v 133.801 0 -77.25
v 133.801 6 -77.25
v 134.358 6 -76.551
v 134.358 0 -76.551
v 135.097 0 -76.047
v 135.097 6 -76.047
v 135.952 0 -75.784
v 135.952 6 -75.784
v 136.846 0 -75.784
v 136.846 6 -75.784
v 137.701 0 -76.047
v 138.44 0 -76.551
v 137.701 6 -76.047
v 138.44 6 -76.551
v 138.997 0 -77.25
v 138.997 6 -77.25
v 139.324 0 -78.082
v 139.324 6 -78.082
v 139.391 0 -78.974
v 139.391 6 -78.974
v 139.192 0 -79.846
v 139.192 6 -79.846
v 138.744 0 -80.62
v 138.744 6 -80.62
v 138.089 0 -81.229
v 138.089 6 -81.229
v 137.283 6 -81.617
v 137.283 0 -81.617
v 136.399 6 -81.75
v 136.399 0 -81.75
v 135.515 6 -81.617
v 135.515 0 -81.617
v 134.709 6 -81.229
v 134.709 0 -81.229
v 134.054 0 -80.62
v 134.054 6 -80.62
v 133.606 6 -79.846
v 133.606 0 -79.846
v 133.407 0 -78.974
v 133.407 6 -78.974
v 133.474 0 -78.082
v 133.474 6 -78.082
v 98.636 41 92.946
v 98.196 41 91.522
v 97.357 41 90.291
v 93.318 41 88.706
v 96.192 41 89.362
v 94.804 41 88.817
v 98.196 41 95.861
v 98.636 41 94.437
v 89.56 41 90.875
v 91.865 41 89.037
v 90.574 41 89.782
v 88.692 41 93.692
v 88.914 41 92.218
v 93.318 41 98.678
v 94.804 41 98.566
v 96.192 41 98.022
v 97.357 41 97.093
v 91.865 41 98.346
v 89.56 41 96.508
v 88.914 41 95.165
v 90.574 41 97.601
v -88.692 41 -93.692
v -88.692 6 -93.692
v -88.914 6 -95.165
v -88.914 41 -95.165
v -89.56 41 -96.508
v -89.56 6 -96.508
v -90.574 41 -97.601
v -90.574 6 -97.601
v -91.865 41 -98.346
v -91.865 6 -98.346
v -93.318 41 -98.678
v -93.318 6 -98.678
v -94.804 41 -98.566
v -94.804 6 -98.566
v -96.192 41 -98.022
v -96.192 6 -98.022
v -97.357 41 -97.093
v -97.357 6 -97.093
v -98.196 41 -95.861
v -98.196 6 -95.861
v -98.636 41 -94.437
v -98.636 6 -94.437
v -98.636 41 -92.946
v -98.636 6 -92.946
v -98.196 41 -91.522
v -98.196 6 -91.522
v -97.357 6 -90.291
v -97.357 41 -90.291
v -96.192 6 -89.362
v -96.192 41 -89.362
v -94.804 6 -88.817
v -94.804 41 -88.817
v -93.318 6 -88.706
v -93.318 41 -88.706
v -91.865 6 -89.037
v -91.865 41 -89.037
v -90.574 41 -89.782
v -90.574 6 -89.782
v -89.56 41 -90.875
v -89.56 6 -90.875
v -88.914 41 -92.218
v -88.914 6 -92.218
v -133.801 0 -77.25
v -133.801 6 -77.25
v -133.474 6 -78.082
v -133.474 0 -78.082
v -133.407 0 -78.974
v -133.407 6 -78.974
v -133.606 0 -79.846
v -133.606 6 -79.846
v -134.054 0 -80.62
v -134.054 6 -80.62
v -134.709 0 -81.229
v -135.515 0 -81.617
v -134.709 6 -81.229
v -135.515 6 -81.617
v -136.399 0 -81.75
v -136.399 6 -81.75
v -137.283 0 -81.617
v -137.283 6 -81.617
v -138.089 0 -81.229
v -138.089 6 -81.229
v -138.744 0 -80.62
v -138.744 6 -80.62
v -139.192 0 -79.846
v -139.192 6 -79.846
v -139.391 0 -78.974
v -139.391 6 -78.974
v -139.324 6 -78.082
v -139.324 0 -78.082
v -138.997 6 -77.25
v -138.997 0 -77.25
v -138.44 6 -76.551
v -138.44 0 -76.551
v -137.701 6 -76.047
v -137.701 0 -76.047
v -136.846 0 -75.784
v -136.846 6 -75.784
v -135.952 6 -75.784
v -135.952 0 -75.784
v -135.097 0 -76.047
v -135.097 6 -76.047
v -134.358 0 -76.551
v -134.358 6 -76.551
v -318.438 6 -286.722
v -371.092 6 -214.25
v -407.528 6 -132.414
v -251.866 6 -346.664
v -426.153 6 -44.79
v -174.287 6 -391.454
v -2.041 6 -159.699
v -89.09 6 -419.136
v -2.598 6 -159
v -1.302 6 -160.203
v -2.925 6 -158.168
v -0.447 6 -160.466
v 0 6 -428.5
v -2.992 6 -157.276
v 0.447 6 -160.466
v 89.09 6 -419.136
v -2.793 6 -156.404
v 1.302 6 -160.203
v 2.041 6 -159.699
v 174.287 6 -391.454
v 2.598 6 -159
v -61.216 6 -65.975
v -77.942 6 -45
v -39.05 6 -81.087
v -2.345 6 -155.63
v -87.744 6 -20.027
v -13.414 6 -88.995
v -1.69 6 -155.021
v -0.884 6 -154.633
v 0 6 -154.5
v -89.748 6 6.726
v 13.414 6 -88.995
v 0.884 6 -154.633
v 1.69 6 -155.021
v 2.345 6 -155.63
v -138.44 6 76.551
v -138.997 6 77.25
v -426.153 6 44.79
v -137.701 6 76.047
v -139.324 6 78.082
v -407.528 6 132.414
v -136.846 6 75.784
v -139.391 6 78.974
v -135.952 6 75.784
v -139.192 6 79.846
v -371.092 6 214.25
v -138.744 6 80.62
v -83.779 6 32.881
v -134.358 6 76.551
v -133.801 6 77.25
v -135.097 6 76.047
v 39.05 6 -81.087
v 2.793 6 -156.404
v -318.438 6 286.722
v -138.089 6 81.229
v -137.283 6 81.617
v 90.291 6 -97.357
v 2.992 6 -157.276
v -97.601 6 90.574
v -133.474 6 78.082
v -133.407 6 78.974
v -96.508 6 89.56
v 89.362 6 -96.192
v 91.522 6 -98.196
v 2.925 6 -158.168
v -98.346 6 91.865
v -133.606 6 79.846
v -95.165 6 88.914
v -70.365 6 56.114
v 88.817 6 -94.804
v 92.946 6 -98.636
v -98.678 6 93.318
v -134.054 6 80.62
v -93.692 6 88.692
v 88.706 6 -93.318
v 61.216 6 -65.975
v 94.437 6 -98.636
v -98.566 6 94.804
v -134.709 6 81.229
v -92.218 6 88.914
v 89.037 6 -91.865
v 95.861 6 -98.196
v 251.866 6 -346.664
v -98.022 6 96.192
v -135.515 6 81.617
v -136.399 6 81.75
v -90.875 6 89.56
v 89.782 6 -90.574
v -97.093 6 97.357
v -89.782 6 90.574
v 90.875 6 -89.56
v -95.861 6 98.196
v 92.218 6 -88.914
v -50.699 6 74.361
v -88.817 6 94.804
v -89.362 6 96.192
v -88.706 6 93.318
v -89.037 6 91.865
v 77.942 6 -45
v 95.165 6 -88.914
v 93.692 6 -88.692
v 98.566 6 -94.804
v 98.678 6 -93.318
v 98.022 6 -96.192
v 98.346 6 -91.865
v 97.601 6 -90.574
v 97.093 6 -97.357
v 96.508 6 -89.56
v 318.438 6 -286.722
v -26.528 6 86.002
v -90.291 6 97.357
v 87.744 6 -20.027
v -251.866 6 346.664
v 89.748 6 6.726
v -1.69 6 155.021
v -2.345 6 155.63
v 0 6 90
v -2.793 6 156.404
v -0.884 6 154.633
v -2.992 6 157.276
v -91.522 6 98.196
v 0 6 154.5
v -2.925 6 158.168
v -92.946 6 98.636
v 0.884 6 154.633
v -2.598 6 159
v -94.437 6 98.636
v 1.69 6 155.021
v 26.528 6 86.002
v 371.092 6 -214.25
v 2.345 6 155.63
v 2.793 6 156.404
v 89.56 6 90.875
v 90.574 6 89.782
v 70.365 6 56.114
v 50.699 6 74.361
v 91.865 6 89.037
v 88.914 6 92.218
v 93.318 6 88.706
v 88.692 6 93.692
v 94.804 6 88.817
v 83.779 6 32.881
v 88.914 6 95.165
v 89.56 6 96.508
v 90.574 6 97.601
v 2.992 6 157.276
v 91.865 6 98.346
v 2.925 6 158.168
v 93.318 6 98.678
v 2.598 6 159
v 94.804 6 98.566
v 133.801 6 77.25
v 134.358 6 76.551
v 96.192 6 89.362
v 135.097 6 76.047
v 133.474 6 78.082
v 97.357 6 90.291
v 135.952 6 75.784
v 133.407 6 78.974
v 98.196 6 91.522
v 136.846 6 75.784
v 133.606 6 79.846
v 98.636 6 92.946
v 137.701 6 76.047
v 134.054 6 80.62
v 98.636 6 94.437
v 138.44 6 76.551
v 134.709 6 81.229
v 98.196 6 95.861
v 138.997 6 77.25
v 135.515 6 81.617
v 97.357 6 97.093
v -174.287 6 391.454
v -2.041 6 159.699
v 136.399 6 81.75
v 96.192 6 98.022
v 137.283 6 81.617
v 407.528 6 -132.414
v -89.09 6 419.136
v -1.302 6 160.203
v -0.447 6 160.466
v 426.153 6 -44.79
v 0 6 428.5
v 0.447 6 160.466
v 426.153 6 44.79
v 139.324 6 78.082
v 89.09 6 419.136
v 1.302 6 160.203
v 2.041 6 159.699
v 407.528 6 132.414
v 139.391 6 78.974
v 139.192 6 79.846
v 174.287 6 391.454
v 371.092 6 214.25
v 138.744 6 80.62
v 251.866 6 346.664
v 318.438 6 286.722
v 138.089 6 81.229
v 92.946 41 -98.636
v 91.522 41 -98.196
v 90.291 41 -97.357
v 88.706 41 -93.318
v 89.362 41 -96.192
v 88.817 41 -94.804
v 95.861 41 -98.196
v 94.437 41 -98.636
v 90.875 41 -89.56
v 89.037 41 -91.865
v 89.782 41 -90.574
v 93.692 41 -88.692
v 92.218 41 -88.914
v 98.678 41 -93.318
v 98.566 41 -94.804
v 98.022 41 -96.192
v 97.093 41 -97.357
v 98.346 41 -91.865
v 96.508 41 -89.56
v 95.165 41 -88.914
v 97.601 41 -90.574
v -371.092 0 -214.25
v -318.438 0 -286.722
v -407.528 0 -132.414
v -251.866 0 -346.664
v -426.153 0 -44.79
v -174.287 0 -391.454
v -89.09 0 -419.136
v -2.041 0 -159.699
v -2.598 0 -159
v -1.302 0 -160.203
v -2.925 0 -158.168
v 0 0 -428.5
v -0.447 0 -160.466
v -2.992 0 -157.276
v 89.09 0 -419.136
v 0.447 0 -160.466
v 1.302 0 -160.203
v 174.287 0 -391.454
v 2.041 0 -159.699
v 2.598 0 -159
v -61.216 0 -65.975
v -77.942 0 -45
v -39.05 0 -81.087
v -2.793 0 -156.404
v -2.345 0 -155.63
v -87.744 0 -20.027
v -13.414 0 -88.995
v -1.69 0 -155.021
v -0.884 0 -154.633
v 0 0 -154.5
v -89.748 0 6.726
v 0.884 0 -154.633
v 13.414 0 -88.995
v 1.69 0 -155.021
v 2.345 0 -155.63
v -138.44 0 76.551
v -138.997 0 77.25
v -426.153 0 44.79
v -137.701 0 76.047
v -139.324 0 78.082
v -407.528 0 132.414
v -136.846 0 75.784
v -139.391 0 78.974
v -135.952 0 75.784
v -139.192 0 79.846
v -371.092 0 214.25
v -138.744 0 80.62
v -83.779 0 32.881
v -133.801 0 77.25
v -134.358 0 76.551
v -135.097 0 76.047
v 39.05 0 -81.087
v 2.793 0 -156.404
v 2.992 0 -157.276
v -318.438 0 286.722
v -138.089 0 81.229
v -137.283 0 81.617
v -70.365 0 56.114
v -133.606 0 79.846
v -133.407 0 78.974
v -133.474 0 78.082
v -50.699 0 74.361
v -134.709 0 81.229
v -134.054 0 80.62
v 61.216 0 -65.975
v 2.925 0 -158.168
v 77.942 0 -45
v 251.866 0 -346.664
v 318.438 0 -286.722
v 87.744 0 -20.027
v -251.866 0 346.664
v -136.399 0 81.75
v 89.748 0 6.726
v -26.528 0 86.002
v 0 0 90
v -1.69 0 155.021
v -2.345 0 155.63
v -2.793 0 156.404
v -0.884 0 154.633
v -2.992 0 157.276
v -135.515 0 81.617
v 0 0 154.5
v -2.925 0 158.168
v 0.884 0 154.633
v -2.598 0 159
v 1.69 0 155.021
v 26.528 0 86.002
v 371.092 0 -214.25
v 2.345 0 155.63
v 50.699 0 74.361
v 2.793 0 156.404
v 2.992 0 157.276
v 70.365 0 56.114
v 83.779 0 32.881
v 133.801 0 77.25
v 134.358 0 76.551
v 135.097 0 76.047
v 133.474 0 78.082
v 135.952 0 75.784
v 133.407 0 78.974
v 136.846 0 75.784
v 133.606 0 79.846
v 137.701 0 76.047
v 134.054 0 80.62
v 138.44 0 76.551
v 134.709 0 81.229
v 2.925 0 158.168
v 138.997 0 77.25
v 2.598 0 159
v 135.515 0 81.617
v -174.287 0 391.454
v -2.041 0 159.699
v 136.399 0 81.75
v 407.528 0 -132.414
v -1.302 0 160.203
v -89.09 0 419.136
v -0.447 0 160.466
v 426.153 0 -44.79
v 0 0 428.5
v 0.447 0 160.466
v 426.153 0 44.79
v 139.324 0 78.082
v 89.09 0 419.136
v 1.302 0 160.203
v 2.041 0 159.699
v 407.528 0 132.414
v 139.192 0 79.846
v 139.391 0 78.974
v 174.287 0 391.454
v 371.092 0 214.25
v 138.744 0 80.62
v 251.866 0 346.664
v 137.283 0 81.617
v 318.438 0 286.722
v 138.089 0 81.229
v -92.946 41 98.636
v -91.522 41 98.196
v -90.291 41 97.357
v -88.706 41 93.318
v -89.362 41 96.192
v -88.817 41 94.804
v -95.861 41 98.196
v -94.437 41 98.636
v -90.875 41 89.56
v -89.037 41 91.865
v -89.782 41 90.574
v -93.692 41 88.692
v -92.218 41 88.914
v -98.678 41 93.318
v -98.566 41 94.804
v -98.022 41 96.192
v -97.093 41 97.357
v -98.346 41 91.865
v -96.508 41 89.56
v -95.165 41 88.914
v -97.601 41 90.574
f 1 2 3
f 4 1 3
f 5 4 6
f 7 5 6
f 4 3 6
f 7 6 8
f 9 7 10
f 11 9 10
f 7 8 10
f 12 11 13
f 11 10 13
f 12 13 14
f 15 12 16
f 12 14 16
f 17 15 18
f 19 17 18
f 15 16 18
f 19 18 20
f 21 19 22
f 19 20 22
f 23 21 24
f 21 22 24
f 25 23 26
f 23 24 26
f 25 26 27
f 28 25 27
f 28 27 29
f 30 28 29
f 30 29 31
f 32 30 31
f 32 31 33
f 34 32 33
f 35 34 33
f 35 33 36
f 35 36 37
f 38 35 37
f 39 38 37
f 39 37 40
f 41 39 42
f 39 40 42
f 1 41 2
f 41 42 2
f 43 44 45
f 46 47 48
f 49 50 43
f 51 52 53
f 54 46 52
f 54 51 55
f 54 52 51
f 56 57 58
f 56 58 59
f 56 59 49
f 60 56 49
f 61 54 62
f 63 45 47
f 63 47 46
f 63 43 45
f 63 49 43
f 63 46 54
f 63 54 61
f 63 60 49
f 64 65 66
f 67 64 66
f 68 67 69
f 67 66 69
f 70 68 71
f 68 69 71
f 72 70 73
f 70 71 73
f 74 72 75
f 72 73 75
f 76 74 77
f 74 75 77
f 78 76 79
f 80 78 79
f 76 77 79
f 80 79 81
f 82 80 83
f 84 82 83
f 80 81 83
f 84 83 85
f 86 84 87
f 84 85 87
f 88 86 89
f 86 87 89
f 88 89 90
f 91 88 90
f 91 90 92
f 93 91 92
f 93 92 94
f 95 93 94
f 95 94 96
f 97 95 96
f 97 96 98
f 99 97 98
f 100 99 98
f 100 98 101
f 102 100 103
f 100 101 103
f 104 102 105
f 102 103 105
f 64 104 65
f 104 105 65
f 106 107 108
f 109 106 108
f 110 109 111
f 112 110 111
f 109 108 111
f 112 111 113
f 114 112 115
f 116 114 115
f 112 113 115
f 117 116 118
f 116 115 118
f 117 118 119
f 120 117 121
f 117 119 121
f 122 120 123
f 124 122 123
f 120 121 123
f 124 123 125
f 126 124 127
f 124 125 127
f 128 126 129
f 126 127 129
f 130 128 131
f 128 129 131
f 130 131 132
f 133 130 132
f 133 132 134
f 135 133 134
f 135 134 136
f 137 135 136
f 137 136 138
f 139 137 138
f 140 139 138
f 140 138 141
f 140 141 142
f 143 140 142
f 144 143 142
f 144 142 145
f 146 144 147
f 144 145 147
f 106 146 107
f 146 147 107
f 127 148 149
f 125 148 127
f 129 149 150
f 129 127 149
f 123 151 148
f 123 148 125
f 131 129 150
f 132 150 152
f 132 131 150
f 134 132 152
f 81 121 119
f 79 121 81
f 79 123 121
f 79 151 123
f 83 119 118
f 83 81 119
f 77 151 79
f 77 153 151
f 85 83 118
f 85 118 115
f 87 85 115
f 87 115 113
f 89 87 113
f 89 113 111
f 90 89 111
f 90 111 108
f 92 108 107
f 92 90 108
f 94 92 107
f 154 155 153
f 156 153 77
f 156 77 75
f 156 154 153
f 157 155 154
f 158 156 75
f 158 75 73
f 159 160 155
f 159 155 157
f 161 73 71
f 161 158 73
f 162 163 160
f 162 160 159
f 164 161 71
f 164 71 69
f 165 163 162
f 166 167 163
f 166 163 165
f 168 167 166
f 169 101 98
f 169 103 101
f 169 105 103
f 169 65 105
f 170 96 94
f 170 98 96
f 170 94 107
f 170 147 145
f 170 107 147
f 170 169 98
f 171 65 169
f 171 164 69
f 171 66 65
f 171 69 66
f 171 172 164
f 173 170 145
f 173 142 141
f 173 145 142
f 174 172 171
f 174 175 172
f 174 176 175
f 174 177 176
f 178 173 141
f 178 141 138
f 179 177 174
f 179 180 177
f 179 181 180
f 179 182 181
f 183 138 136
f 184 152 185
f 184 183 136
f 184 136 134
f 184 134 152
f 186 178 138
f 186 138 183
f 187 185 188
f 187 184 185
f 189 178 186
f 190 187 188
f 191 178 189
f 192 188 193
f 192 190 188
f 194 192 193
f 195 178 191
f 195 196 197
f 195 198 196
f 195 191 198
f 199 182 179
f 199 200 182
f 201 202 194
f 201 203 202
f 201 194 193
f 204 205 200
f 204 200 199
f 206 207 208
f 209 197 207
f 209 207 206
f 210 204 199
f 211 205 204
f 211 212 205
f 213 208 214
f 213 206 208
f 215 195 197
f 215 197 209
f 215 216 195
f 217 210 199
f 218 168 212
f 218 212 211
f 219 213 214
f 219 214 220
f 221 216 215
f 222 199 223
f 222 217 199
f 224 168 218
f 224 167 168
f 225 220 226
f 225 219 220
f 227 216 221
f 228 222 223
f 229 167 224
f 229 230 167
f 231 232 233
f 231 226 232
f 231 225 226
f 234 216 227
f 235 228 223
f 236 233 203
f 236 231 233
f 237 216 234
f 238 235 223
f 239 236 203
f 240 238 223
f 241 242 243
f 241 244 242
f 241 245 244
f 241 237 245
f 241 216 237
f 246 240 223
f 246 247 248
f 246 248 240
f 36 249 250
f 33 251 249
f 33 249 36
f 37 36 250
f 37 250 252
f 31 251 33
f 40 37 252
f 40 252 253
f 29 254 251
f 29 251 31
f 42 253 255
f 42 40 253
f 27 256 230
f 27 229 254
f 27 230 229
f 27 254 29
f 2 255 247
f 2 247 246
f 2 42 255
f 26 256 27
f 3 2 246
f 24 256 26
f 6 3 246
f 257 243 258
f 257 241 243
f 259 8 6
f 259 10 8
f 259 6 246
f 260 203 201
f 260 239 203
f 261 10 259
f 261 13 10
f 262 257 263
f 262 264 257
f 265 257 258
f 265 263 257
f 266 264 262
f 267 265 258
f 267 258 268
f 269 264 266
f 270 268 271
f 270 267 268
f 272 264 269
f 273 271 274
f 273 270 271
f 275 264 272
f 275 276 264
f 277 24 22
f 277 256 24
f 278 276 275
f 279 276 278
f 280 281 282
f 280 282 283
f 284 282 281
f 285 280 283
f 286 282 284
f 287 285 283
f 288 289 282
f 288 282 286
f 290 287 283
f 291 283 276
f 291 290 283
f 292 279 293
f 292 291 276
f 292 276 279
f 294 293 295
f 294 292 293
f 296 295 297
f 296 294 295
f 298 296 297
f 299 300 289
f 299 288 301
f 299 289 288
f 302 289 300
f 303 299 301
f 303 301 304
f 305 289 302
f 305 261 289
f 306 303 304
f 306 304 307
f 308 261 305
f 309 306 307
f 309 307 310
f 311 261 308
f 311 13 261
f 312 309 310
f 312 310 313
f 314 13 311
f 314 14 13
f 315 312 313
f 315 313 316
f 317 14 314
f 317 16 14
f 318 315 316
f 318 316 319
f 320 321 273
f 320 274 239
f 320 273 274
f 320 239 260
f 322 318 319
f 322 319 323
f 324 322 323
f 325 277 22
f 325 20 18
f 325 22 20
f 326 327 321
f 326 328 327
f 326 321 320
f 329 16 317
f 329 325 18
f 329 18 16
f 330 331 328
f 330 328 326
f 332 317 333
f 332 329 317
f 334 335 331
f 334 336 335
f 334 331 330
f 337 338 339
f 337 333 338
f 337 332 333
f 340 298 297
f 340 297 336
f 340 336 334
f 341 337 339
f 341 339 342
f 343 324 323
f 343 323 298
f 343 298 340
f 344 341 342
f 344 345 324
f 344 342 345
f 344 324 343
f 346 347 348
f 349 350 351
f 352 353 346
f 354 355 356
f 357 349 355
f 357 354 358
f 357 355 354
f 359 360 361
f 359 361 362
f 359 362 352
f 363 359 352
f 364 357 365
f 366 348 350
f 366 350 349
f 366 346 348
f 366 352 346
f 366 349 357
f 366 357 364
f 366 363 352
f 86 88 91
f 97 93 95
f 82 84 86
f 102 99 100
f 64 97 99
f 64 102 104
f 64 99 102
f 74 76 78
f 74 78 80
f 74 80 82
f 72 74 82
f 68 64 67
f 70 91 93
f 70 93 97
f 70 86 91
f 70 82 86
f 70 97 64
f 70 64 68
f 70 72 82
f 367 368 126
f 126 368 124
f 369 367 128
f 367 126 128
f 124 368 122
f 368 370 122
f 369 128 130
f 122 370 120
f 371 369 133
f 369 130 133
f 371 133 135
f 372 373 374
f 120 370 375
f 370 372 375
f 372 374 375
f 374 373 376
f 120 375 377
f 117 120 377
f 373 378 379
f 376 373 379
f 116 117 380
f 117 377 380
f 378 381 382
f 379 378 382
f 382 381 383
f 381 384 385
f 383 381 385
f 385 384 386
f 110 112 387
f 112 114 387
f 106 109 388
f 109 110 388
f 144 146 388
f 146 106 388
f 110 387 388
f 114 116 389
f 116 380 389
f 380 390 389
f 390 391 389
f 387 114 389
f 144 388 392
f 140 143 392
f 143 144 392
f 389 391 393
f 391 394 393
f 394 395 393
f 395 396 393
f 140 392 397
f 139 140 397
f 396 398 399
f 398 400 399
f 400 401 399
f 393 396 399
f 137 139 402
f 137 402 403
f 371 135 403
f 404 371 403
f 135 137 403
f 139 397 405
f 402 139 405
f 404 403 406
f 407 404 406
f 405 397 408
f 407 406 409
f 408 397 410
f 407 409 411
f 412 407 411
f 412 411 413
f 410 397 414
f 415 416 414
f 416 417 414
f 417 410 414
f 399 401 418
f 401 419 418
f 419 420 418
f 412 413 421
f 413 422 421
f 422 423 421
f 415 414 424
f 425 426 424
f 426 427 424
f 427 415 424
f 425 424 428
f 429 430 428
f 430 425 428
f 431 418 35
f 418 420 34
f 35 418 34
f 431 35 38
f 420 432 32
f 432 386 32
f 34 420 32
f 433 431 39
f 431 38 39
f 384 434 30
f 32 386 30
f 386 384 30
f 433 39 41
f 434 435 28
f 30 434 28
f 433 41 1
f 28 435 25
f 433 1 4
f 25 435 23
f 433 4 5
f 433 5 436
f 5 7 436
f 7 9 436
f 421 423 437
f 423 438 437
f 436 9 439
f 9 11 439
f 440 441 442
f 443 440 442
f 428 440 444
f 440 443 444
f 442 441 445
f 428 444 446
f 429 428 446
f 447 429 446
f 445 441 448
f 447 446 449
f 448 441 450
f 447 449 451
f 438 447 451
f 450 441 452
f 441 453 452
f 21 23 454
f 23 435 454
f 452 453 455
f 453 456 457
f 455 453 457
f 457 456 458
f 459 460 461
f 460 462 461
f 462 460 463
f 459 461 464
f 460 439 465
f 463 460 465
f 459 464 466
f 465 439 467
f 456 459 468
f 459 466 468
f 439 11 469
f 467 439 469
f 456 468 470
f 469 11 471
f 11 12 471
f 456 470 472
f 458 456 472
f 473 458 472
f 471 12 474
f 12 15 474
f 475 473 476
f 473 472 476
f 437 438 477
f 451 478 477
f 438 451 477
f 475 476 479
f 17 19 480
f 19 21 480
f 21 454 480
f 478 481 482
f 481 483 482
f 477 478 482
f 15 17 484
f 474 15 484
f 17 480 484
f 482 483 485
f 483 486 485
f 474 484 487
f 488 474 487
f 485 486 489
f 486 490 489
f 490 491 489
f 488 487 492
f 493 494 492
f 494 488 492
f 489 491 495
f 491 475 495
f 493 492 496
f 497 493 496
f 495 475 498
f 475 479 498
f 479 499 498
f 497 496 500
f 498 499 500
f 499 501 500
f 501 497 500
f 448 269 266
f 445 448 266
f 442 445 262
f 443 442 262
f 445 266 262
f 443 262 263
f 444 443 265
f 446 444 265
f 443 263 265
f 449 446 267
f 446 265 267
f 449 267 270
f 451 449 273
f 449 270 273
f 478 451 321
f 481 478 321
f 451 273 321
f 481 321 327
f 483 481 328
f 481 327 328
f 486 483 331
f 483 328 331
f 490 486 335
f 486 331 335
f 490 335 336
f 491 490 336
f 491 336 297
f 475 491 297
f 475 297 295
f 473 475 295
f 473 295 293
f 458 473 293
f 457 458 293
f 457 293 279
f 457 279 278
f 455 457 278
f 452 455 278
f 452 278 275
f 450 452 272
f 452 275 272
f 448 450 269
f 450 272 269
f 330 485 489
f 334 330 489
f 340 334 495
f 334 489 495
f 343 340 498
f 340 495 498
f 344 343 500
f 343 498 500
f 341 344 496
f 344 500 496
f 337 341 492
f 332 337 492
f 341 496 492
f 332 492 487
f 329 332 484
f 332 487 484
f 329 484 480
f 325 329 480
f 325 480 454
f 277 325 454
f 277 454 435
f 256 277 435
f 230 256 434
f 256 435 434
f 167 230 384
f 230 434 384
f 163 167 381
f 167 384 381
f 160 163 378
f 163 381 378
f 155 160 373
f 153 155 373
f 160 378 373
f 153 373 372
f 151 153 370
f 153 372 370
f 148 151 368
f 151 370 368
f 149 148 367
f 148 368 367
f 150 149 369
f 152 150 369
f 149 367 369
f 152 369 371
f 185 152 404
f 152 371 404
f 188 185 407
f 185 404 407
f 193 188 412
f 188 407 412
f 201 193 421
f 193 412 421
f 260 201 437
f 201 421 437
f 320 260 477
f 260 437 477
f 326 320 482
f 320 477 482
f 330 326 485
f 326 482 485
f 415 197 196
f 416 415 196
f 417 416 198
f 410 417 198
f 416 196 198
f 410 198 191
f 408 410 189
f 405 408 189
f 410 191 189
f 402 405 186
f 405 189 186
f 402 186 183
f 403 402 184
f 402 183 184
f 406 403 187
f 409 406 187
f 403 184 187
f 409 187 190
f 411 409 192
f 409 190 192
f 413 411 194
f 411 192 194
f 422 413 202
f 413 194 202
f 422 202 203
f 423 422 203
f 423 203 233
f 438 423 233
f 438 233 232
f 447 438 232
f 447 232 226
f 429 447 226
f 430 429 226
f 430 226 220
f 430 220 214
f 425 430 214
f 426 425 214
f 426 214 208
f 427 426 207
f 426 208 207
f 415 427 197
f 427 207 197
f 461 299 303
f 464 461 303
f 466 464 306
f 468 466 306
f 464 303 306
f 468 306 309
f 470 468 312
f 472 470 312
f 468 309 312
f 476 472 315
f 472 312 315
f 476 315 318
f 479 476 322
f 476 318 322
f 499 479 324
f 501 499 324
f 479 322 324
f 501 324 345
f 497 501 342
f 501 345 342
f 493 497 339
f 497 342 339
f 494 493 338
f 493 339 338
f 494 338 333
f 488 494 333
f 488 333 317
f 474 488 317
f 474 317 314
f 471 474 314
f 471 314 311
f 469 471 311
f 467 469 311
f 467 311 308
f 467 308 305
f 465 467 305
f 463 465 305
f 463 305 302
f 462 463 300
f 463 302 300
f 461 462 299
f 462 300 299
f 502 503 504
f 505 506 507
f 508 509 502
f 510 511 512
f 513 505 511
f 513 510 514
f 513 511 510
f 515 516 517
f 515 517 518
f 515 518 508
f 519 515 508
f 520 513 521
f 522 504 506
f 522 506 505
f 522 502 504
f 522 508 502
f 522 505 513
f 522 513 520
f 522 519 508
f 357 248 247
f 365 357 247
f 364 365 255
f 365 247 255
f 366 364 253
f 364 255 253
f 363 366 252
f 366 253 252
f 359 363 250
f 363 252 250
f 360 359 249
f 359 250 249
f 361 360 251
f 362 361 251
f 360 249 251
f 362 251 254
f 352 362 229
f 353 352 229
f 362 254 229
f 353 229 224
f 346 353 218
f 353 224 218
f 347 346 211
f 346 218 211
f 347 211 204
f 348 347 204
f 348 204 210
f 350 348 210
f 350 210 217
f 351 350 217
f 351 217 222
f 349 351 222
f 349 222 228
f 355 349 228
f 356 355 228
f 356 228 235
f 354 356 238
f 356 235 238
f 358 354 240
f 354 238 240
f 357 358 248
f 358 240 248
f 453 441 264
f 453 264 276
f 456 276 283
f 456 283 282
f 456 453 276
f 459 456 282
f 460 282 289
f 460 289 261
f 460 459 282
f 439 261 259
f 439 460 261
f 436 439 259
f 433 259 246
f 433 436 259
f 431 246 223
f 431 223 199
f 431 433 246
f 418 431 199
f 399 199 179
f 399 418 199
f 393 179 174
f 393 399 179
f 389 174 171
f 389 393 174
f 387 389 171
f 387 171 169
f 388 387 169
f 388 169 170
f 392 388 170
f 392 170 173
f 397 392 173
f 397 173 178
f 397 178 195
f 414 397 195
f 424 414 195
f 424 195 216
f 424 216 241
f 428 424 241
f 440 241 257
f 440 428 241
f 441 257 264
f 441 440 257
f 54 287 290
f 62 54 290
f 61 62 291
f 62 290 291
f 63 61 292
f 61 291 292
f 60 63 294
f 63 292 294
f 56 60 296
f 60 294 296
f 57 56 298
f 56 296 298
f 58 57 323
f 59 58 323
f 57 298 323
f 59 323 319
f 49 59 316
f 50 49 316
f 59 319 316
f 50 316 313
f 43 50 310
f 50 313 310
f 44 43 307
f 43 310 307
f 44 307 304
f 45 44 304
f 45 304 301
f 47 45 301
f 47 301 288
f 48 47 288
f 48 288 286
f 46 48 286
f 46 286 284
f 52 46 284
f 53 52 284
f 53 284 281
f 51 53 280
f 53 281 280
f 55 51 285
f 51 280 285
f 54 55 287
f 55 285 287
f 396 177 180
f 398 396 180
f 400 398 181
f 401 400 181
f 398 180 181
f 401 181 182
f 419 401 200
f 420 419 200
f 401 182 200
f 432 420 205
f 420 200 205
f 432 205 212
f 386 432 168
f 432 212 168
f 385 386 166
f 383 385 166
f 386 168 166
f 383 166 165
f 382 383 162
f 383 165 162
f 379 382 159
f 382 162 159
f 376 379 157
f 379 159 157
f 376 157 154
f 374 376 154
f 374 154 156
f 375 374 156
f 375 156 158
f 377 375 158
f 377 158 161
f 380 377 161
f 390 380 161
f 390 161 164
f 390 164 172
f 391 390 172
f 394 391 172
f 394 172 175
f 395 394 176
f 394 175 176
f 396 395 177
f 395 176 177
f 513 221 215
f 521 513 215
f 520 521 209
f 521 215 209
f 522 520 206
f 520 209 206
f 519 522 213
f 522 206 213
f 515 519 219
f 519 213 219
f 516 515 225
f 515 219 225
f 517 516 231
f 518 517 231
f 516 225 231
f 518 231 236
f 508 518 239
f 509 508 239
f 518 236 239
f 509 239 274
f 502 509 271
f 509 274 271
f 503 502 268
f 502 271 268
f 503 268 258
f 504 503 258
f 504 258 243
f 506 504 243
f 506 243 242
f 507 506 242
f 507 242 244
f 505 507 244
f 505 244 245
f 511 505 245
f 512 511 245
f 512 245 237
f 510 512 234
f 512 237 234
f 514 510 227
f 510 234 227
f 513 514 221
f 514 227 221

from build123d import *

# Parameters (mm, degrees)
SKETCH1_R           = 428.5
SKETCH1_R_2         = 90
BOSS_EXTRUDE1_DEPTH = 6
SKETCH2_R           = 3
CUT_EXTRUDE1_DEPTH  = 6
SKETCH5_R           = 5
BOSS_EXTRUDE2_DEPTH = 35
CIRPATTERN1_COUNT   = 6
CIRPATTERN2_COUNT   = 4


with BuildPart() as part:
    # Sketch1 → Boss-Extrude1 (new body)
    with BuildSketch(Plane(origin=(0, 0, 0), x_dir=(1, 0, 0), z_dir=(0, 1, 0))):
        with Locations(Location((0, 0, 0), (0, 0, 270))):
            Circle(SKETCH1_R)
        with Locations(Location((0, 0, 0), (0, 0, 270))):
            Circle(SKETCH1_R_2, mode=Mode.SUBTRACT)
    extrude(amount=BOSS_EXTRUDE1_DEPTH)

    # Sketch2 → Cut-Extrude1 (cut)
    with BuildSketch(Plane(origin=(0, 6, 0), x_dir=(1, 0, 0), z_dir=(0, 1, 0))):
        with Locations(Location((0, 157.5, 0), (0, 0, 270))):
            Circle(SKETCH2_R)
    cut_extrude1 = extrude(amount=-CUT_EXTRUDE1_DEPTH, mode=Mode.SUBTRACT)

    # Sketch5 → Boss-Extrude2 (add)
    with BuildSketch(Plane(origin=(0, 6, 0), x_dir=(1, 0, 0), z_dir=(0, 1, 0))):
        with Locations(Location((93.691648507, 93.691648507, 0), (0, 0, 270))):
            Circle(SKETCH5_R)
    boss_extrude2 = extrude(amount=BOSS_EXTRUDE2_DEPTH)

    # CirPattern1: Cut-Extrude1 ×6 about axis
    cirpattern1_axis = Axis((0, 0, 0), (0, 1, 0))
    for i in range(1, CIRPATTERN1_COUNT):
        add(cut_extrude1.rotate(cirpattern1_axis, i * 360 / CIRPATTERN1_COUNT), mode=Mode.SUBTRACT)

    # CirPattern2: Boss-Extrude2 ×4 about axis
    cirpattern2_axis = Axis((0, 0, 0), (0, 1, 0))
    for i in range(1, CIRPATTERN2_COUNT):
        add(boss_extrude2.rotate(cirpattern2_axis, i * 360 / CIRPATTERN2_COUNT))


solid = part.part
